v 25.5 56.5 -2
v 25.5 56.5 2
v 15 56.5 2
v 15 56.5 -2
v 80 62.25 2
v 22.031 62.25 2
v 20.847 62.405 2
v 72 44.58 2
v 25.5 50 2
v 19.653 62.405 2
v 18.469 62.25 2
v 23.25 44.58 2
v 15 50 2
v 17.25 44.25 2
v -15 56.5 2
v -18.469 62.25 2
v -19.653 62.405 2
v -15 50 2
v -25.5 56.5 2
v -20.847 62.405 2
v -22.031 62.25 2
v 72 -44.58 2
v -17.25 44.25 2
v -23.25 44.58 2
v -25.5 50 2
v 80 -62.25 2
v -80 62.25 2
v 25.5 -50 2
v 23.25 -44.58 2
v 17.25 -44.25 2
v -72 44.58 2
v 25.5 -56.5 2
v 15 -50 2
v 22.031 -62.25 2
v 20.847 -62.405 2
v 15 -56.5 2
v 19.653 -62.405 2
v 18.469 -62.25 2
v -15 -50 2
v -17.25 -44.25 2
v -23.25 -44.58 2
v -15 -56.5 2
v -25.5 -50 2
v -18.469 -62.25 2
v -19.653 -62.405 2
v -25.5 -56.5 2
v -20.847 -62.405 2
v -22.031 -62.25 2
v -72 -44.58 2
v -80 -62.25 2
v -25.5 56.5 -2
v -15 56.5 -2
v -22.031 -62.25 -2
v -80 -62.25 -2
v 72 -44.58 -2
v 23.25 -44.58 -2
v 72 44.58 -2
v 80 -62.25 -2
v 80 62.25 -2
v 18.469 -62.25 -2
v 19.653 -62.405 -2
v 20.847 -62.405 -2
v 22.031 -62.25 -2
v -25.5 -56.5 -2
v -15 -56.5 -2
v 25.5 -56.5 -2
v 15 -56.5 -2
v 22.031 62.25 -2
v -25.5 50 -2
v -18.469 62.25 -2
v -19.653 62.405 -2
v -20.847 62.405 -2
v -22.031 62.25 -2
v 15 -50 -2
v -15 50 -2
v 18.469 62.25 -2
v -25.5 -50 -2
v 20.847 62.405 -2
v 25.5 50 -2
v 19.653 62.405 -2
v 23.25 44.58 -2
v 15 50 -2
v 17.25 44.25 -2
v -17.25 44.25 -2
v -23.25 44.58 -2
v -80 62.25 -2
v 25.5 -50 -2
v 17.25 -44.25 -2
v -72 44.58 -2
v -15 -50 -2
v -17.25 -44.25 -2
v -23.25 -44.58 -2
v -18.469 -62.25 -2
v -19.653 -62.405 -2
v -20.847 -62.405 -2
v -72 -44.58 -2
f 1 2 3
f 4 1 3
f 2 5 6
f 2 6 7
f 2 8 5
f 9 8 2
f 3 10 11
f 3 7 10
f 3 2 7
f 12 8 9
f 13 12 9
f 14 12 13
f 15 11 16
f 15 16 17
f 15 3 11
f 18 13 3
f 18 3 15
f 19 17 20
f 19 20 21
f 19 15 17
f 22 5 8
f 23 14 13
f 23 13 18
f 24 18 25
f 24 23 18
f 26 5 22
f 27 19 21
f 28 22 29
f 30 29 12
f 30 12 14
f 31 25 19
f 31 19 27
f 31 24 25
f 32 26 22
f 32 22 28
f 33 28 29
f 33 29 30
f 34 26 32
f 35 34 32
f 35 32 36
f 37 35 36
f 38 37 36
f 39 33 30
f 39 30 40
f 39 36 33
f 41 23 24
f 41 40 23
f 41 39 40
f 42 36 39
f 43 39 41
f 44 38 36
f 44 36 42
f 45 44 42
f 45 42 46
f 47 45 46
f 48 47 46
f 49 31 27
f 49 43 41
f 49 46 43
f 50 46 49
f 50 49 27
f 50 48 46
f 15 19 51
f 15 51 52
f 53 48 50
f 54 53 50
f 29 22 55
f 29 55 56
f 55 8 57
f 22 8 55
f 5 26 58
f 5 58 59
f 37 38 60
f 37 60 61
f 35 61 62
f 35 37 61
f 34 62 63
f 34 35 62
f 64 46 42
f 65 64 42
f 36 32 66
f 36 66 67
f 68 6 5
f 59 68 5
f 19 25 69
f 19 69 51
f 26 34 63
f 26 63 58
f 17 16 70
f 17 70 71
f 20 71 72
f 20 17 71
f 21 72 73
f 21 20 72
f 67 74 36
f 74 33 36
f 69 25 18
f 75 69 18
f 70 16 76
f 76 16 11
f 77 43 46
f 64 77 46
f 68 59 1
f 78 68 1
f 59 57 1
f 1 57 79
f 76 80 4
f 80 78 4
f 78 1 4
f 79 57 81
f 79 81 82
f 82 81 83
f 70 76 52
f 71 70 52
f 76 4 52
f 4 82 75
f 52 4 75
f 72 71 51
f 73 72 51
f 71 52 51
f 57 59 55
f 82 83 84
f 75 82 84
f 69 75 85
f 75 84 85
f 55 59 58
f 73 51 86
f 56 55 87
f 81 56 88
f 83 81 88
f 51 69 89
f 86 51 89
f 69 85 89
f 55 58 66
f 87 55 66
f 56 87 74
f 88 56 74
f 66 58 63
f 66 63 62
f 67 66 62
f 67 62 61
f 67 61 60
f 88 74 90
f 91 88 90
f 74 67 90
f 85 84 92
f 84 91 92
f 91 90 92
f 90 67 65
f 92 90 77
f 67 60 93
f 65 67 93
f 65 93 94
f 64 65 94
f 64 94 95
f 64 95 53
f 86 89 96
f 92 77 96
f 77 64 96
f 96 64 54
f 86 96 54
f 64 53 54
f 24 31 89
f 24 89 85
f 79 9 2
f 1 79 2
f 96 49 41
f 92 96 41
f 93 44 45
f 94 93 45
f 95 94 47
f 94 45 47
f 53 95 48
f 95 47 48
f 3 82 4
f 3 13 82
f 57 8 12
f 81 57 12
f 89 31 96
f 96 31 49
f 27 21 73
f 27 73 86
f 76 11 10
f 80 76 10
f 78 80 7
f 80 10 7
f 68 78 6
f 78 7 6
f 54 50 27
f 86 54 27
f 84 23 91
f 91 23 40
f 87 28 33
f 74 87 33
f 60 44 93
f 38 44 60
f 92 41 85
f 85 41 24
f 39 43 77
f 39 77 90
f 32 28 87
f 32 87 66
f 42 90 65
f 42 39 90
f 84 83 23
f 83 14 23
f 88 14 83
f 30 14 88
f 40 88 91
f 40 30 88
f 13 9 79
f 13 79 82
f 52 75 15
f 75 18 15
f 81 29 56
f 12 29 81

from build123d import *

# Parameters (mm, degrees)
F0_W     = 10.5
F0_H     = 6.5
F0_W_2   = 17.25
F0_H_2   = 0.3298058208
F0_W_3   = 8
F0_H_3   = 17.6701941792
F0_H_4   = 44.5798058208
F1_DEPTH = 2


with BuildPart() as f1:
    # F0 (on Top) → F1 (new body, symmetric)
    with BuildSketch(Plane.XY):
        with BuildLine():
            Line((0, 62.25), (-18.4689140656, 62.25))
            ThreePointArc((-18.4689140656, 62.25), (-13.1608209467, 59.0737279689), (-11.0754554824, 53.25))
            ThreePointArc((-11.0754554824, 53.25), (-12.7768513778, 47.9279405512), (-17.25, 44.5798058208))
            Line((-17.25, 44.5798058208), (0, 44.5798058208))
            Line((0, 44.5798058208), (0, 62.25))
        make_face()
        with BuildLine():
            Line((-22.0310859344, 62.25), (-18.4689140656, 62.25))
            ThreePointArc((-18.4689140656, 62.25), (-20.25, 62.4245445176), (-22.0310859344, 62.25))
        make_face()
        with BuildLine():
            ThreePointArc((-11.0754554824, 53.25), (-13.1608209467, 59.0737279689), (-18.4689140656, 62.25))
            Line((-18.4689140656, 62.25), (-22.0310859344, 62.25))
            ThreePointArc((-22.0310859344, 62.25), (-29.4027939047, 53.8813721919), (-23.25, 44.5798058208))
            Line((-23.25, 44.5798058208), (-17.25, 44.5798058208))
            ThreePointArc((-17.25, 44.5798058208), (-12.7768513778, 47.9279405512), (-11.0754554824, 53.25))
        make_face()
        with Locations((-20.25, 53.25)):
            Rectangle(F0_W, F0_H, mode=Mode.SUBTRACT)
        with BuildLine():
            ThreePointArc((-23.25, 44.5798058208), (-29.4027939047, 53.8813721919), (-22.0310859344, 62.25))
            Line((-22.0310859344, 62.25), (-72, 62.25))
            Line((-72, 62.25), (-72, 44.5798058208))
            Line((-72, 44.5798058208), (-23.25, 44.5798058208))
        make_face()
        with Locations((-8.625, 44.4149029104)):
            Rectangle(F0_W_2, F0_H_2)
        with BuildLine():
            Line((-17.25, 44.25), (-17.25, 44.5798058208))
            ThreePointArc((-17.25, 44.5798058208), (-17.8537761691, 44.3939072691), (-18.4689140656, 44.25))
            Line((-18.4689140656, 44.25), (-17.25, 44.25))
        make_face()
        with BuildLine():
            ThreePointArc((-18.4689140656, 44.25), (-17.8537761691, 44.3939072691), (-17.25, 44.5798058208))
            Line((-17.25, 44.5798058208), (-23.25, 44.5798058208))
            ThreePointArc((-23.25, 44.5798058208), (-20.8813721919, 44.0972060953), (-18.4689140656, 44.25))
        make_face()
        with BuildLine():
            ThreePointArc((-18.4689140656, 44.25), (-20.8813721919, 44.0972060953), (-23.25, 44.5798058208))
            Line((-23.25, 44.5798058208), (-23.25, 0))
            Line((-23.25, 0), (-17.25, 0))
            Line((-17.25, 0), (-17.25, 44.25))
            Line((-17.25, 44.25), (-18.4689140656, 44.25))
        make_face()
        with Locations((-76, 53.4149029104)):
            Rectangle(F0_W_3, F0_H_3)
        with Locations((-76, 22.2899029104)):
            Rectangle(F0_W_3, F0_H_4)
    extrude(amount=F1_DEPTH, both=True)

    # F2: F1 across face


with BuildPart() as f1_1:
    add(f1.part)
    add(f1.part.mirror(Plane(origin=(0, 53.25, 0), x_dir=(0, 1, 0), z_dir=(1, 0, 0))))

    # F3: F1 across face


with BuildPart() as f1_2:
    add(f1_1.part)
    add(f1_1.part.mirror(Plane(origin=(-20.25, 0, 0), x_dir=(1, 0, 0), z_dir=(0, -1, 0))))


solid = f1_2.part
